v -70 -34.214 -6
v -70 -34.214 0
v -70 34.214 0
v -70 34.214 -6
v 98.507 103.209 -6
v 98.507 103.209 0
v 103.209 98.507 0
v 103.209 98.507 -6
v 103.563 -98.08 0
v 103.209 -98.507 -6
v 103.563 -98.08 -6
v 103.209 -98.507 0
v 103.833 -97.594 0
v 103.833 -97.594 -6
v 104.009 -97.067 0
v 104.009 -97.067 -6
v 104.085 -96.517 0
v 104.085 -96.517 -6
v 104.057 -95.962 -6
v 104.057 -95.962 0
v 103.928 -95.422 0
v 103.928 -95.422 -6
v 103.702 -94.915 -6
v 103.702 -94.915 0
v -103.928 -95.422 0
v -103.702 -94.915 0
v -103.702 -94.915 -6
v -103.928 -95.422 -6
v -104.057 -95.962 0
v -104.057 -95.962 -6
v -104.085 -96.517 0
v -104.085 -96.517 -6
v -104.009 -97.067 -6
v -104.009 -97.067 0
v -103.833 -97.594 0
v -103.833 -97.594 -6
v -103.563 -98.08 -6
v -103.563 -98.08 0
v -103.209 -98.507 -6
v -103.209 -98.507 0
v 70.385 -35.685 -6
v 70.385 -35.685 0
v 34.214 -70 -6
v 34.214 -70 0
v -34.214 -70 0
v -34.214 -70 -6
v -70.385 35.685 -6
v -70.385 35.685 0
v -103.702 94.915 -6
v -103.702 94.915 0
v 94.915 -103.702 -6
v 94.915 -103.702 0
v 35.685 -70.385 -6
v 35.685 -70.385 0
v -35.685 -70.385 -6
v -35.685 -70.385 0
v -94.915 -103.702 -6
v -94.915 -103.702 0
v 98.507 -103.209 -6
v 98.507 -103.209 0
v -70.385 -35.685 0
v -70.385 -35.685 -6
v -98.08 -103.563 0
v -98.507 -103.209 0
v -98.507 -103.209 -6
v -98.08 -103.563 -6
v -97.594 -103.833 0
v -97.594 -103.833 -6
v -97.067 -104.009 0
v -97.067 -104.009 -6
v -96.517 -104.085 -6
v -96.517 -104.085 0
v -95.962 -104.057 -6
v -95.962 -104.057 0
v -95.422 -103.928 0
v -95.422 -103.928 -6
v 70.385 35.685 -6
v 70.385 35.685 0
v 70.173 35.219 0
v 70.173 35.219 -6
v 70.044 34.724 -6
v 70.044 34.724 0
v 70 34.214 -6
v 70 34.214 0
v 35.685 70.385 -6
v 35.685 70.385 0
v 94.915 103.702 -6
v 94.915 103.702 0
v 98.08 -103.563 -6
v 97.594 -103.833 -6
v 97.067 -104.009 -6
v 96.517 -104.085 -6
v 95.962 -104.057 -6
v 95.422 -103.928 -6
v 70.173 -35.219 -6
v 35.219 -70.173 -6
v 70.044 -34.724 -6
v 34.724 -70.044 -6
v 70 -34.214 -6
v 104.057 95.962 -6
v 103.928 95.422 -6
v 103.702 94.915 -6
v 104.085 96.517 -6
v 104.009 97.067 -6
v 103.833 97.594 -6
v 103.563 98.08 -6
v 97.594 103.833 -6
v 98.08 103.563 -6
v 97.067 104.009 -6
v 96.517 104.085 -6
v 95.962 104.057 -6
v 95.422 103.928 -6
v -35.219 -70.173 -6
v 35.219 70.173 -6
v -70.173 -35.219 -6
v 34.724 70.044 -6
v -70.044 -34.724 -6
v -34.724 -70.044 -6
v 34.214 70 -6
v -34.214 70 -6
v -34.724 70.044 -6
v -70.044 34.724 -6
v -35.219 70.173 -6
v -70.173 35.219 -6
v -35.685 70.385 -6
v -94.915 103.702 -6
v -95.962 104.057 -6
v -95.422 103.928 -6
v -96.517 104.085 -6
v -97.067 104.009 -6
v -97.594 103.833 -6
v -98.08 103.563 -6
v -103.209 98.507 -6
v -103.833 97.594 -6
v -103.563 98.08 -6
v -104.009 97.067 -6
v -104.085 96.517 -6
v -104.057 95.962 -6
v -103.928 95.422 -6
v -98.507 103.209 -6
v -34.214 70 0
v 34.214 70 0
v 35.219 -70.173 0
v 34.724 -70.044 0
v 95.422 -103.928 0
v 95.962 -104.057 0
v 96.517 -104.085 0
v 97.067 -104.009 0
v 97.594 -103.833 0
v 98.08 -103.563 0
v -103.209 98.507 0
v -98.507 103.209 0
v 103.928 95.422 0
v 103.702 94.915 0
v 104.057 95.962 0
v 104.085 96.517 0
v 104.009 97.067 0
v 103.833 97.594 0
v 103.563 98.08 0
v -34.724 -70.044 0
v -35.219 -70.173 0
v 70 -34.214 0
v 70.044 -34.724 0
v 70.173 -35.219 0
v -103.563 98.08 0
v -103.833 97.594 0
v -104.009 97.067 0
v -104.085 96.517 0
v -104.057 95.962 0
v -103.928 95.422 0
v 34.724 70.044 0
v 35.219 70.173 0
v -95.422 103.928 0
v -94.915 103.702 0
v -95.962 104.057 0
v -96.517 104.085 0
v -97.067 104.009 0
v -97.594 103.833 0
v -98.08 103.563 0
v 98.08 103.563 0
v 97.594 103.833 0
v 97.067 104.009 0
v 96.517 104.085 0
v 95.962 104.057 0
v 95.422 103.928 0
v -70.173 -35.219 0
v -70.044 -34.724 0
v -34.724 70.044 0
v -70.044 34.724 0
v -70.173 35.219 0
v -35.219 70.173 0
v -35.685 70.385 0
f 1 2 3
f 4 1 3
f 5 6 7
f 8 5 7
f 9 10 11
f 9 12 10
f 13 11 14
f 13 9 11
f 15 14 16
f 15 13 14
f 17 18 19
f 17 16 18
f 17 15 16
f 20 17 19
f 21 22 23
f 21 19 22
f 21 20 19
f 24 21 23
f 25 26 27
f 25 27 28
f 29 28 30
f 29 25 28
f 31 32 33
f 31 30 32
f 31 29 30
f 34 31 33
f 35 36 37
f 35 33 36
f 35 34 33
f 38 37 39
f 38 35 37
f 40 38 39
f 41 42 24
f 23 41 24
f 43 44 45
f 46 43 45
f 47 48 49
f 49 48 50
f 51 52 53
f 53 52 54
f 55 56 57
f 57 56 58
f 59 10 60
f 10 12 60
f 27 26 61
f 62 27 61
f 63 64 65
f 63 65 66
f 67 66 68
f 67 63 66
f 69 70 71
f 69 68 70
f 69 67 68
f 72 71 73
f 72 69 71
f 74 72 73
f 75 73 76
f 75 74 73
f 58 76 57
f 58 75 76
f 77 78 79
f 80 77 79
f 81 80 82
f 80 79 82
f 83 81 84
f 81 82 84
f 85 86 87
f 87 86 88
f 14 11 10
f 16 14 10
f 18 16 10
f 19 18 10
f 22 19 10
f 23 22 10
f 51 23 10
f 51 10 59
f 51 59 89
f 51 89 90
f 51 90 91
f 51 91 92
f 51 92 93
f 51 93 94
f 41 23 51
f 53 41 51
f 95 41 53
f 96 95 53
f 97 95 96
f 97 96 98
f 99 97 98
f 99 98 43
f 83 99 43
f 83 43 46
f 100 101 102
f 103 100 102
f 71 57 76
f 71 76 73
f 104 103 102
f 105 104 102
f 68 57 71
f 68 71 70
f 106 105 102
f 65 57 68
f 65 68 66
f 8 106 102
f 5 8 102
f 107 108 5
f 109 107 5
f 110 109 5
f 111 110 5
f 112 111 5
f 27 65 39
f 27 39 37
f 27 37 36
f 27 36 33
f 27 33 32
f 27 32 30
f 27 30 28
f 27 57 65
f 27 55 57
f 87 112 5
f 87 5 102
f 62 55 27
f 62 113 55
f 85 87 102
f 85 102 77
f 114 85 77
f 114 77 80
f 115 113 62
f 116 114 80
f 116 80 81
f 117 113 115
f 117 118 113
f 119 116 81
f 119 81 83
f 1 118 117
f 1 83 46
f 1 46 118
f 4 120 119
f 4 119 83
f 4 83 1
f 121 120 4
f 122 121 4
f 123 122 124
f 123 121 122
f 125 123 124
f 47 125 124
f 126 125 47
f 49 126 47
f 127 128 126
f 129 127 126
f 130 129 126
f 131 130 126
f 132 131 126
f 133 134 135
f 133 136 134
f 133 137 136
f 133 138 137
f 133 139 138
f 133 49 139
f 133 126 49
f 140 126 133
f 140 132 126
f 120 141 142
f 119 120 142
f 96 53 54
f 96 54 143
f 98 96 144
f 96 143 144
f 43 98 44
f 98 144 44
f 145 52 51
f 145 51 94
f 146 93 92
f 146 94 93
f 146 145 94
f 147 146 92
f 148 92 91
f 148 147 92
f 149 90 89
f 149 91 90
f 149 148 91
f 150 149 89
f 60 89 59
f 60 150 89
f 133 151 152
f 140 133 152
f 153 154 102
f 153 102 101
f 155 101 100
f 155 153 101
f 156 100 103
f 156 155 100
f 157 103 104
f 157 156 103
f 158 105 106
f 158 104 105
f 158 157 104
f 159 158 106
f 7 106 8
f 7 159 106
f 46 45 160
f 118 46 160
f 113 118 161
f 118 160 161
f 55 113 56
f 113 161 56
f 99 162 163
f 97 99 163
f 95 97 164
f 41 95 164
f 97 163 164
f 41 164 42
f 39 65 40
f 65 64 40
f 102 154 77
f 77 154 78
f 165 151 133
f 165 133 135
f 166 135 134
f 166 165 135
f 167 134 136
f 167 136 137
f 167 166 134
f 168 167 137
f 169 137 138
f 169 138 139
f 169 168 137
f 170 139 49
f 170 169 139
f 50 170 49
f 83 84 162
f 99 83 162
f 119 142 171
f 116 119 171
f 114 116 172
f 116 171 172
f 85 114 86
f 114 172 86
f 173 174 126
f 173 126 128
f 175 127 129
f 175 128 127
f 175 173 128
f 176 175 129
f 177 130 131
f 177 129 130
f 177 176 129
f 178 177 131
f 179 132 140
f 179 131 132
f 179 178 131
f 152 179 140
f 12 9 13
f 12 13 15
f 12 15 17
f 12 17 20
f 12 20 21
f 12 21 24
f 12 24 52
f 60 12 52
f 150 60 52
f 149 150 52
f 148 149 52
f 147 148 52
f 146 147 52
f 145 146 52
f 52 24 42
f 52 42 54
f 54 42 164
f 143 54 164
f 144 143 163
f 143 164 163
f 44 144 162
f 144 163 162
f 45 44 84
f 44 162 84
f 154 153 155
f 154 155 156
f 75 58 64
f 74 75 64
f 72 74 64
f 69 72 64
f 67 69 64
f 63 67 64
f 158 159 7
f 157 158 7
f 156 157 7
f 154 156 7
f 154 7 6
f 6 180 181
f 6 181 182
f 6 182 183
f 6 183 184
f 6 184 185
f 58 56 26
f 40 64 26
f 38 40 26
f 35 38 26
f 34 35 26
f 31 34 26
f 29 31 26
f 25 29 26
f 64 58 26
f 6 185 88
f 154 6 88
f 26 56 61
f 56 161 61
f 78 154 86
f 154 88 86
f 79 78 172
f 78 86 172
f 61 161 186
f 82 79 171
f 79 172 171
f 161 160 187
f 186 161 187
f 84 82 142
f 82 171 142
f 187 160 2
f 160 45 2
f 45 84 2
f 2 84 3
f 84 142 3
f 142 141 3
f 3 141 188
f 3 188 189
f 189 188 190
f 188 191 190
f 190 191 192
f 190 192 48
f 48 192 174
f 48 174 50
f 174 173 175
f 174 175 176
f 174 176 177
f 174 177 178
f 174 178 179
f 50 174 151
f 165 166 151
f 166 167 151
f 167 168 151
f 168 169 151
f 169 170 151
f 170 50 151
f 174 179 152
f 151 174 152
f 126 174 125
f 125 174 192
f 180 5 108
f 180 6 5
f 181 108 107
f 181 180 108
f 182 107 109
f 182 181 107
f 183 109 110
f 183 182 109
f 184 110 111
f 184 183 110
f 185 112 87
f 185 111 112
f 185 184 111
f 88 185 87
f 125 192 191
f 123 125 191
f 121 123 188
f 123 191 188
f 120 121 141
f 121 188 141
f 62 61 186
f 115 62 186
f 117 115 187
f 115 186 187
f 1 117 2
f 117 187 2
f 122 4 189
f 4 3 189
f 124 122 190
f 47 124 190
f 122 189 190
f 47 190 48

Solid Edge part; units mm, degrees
sketch "Sketch1" plane through (0, 0, 0) normal (0, 0, 1) x (1, 0, 0)
  line L0 (-70.3853, 35.6849) -> (-103.7021, 94.9149)
  arc A0 (-103.2087, 98.507) -> (-103.7021, 94.9149) centre (-101.0874, 96.3857) ccw
  line L1 (-103.2087, 98.507) -> (-98.507, 103.2087)
  arc A1 (-98.507, 103.2087) -> (-94.9149, 103.7021) centre (-96.3857, 101.0874) cw
  line L2 (-94.9149, 103.7021) -> (-35.6849, 70.3853)
  arc A2 (-35.6849, 70.3853) -> (-34.2141, 70) centre (-34.2141, 73) ccw
  line L3 (-34.2141, 70) -> (34.2141, 70)
  arc A3 (34.2141, 70) -> (35.6849, 70.3853) centre (34.2141, 73) ccw
  line L4 (35.6849, 70.3853) -> (94.9149, 103.7021)
  arc A4 (94.9149, 103.7021) -> (98.507, 103.2087) centre (96.3857, 101.0874) cw
  line L5 (98.507, 103.2087) -> (103.2087, 98.507)
  arc A5 (103.2087, 98.507) -> (103.7021, 94.9149) centre (101.0874, 96.3857) cw
  line L6 (103.7021, 94.9149) -> (70.3853, 35.6849)
  arc A6 (70.3853, 35.6849) -> (70, 34.2141) centre (73, 34.2141) ccw
  line L7 (70, 34.2141) -> (70, -34.2141)
  arc A7 (70, -34.2141) -> (70.3853, -35.6849) centre (73, -34.2141) ccw
  line L8 (70.3853, -35.6849) -> (103.7021, -94.9149)
  arc A8 (103.7021, -94.9149) -> (103.2087, -98.507) centre (101.0874, -96.3857) cw
  line L9 (103.2087, -98.507) -> (98.507, -103.2087)
  arc A9 (98.507, -103.2087) -> (94.9149, -103.7021) centre (96.3857, -101.0874) cw
  line L10 (94.9149, -103.7021) -> (35.6849, -70.3853)
  arc A10 (34.2141, -70) -> (35.6849, -70.3853) centre (34.2141, -73) cw
  line L11 (34.2141, -70) -> (-34.2141, -70)
  arc A11 (-34.2141, -70) -> (-35.6849, -70.3853) centre (-34.2141, -73) ccw
  line L12 (-35.6849, -70.3853) -> (-94.9149, -103.7021)
  arc A12 (-94.9149, -103.7021) -> (-98.507, -103.2087) centre (-96.3857, -101.0874) cw
  line L13 (-98.507, -103.2087) -> (-103.2087, -98.507)
  arc A13 (-103.2087, -98.507) -> (-103.7021, -94.9149) centre (-101.0874, -96.3857) cw
  line L14 (-103.7021, -94.9149) -> (-70.3853, -35.6849)
  arc A14 (-70.3853, -35.6849) -> (-70, -34.2141) centre (-73, -34.2141) ccw
  line L15 (-70, -34.2141) -> (-70, 34.2141)
  arc A15 (-70, 34.2141) -> (-70.3853, 35.6849) centre (-73, 34.2141) ccw
extrude "Protrusion1" add sketch "Sketch1" against normal blind 6
